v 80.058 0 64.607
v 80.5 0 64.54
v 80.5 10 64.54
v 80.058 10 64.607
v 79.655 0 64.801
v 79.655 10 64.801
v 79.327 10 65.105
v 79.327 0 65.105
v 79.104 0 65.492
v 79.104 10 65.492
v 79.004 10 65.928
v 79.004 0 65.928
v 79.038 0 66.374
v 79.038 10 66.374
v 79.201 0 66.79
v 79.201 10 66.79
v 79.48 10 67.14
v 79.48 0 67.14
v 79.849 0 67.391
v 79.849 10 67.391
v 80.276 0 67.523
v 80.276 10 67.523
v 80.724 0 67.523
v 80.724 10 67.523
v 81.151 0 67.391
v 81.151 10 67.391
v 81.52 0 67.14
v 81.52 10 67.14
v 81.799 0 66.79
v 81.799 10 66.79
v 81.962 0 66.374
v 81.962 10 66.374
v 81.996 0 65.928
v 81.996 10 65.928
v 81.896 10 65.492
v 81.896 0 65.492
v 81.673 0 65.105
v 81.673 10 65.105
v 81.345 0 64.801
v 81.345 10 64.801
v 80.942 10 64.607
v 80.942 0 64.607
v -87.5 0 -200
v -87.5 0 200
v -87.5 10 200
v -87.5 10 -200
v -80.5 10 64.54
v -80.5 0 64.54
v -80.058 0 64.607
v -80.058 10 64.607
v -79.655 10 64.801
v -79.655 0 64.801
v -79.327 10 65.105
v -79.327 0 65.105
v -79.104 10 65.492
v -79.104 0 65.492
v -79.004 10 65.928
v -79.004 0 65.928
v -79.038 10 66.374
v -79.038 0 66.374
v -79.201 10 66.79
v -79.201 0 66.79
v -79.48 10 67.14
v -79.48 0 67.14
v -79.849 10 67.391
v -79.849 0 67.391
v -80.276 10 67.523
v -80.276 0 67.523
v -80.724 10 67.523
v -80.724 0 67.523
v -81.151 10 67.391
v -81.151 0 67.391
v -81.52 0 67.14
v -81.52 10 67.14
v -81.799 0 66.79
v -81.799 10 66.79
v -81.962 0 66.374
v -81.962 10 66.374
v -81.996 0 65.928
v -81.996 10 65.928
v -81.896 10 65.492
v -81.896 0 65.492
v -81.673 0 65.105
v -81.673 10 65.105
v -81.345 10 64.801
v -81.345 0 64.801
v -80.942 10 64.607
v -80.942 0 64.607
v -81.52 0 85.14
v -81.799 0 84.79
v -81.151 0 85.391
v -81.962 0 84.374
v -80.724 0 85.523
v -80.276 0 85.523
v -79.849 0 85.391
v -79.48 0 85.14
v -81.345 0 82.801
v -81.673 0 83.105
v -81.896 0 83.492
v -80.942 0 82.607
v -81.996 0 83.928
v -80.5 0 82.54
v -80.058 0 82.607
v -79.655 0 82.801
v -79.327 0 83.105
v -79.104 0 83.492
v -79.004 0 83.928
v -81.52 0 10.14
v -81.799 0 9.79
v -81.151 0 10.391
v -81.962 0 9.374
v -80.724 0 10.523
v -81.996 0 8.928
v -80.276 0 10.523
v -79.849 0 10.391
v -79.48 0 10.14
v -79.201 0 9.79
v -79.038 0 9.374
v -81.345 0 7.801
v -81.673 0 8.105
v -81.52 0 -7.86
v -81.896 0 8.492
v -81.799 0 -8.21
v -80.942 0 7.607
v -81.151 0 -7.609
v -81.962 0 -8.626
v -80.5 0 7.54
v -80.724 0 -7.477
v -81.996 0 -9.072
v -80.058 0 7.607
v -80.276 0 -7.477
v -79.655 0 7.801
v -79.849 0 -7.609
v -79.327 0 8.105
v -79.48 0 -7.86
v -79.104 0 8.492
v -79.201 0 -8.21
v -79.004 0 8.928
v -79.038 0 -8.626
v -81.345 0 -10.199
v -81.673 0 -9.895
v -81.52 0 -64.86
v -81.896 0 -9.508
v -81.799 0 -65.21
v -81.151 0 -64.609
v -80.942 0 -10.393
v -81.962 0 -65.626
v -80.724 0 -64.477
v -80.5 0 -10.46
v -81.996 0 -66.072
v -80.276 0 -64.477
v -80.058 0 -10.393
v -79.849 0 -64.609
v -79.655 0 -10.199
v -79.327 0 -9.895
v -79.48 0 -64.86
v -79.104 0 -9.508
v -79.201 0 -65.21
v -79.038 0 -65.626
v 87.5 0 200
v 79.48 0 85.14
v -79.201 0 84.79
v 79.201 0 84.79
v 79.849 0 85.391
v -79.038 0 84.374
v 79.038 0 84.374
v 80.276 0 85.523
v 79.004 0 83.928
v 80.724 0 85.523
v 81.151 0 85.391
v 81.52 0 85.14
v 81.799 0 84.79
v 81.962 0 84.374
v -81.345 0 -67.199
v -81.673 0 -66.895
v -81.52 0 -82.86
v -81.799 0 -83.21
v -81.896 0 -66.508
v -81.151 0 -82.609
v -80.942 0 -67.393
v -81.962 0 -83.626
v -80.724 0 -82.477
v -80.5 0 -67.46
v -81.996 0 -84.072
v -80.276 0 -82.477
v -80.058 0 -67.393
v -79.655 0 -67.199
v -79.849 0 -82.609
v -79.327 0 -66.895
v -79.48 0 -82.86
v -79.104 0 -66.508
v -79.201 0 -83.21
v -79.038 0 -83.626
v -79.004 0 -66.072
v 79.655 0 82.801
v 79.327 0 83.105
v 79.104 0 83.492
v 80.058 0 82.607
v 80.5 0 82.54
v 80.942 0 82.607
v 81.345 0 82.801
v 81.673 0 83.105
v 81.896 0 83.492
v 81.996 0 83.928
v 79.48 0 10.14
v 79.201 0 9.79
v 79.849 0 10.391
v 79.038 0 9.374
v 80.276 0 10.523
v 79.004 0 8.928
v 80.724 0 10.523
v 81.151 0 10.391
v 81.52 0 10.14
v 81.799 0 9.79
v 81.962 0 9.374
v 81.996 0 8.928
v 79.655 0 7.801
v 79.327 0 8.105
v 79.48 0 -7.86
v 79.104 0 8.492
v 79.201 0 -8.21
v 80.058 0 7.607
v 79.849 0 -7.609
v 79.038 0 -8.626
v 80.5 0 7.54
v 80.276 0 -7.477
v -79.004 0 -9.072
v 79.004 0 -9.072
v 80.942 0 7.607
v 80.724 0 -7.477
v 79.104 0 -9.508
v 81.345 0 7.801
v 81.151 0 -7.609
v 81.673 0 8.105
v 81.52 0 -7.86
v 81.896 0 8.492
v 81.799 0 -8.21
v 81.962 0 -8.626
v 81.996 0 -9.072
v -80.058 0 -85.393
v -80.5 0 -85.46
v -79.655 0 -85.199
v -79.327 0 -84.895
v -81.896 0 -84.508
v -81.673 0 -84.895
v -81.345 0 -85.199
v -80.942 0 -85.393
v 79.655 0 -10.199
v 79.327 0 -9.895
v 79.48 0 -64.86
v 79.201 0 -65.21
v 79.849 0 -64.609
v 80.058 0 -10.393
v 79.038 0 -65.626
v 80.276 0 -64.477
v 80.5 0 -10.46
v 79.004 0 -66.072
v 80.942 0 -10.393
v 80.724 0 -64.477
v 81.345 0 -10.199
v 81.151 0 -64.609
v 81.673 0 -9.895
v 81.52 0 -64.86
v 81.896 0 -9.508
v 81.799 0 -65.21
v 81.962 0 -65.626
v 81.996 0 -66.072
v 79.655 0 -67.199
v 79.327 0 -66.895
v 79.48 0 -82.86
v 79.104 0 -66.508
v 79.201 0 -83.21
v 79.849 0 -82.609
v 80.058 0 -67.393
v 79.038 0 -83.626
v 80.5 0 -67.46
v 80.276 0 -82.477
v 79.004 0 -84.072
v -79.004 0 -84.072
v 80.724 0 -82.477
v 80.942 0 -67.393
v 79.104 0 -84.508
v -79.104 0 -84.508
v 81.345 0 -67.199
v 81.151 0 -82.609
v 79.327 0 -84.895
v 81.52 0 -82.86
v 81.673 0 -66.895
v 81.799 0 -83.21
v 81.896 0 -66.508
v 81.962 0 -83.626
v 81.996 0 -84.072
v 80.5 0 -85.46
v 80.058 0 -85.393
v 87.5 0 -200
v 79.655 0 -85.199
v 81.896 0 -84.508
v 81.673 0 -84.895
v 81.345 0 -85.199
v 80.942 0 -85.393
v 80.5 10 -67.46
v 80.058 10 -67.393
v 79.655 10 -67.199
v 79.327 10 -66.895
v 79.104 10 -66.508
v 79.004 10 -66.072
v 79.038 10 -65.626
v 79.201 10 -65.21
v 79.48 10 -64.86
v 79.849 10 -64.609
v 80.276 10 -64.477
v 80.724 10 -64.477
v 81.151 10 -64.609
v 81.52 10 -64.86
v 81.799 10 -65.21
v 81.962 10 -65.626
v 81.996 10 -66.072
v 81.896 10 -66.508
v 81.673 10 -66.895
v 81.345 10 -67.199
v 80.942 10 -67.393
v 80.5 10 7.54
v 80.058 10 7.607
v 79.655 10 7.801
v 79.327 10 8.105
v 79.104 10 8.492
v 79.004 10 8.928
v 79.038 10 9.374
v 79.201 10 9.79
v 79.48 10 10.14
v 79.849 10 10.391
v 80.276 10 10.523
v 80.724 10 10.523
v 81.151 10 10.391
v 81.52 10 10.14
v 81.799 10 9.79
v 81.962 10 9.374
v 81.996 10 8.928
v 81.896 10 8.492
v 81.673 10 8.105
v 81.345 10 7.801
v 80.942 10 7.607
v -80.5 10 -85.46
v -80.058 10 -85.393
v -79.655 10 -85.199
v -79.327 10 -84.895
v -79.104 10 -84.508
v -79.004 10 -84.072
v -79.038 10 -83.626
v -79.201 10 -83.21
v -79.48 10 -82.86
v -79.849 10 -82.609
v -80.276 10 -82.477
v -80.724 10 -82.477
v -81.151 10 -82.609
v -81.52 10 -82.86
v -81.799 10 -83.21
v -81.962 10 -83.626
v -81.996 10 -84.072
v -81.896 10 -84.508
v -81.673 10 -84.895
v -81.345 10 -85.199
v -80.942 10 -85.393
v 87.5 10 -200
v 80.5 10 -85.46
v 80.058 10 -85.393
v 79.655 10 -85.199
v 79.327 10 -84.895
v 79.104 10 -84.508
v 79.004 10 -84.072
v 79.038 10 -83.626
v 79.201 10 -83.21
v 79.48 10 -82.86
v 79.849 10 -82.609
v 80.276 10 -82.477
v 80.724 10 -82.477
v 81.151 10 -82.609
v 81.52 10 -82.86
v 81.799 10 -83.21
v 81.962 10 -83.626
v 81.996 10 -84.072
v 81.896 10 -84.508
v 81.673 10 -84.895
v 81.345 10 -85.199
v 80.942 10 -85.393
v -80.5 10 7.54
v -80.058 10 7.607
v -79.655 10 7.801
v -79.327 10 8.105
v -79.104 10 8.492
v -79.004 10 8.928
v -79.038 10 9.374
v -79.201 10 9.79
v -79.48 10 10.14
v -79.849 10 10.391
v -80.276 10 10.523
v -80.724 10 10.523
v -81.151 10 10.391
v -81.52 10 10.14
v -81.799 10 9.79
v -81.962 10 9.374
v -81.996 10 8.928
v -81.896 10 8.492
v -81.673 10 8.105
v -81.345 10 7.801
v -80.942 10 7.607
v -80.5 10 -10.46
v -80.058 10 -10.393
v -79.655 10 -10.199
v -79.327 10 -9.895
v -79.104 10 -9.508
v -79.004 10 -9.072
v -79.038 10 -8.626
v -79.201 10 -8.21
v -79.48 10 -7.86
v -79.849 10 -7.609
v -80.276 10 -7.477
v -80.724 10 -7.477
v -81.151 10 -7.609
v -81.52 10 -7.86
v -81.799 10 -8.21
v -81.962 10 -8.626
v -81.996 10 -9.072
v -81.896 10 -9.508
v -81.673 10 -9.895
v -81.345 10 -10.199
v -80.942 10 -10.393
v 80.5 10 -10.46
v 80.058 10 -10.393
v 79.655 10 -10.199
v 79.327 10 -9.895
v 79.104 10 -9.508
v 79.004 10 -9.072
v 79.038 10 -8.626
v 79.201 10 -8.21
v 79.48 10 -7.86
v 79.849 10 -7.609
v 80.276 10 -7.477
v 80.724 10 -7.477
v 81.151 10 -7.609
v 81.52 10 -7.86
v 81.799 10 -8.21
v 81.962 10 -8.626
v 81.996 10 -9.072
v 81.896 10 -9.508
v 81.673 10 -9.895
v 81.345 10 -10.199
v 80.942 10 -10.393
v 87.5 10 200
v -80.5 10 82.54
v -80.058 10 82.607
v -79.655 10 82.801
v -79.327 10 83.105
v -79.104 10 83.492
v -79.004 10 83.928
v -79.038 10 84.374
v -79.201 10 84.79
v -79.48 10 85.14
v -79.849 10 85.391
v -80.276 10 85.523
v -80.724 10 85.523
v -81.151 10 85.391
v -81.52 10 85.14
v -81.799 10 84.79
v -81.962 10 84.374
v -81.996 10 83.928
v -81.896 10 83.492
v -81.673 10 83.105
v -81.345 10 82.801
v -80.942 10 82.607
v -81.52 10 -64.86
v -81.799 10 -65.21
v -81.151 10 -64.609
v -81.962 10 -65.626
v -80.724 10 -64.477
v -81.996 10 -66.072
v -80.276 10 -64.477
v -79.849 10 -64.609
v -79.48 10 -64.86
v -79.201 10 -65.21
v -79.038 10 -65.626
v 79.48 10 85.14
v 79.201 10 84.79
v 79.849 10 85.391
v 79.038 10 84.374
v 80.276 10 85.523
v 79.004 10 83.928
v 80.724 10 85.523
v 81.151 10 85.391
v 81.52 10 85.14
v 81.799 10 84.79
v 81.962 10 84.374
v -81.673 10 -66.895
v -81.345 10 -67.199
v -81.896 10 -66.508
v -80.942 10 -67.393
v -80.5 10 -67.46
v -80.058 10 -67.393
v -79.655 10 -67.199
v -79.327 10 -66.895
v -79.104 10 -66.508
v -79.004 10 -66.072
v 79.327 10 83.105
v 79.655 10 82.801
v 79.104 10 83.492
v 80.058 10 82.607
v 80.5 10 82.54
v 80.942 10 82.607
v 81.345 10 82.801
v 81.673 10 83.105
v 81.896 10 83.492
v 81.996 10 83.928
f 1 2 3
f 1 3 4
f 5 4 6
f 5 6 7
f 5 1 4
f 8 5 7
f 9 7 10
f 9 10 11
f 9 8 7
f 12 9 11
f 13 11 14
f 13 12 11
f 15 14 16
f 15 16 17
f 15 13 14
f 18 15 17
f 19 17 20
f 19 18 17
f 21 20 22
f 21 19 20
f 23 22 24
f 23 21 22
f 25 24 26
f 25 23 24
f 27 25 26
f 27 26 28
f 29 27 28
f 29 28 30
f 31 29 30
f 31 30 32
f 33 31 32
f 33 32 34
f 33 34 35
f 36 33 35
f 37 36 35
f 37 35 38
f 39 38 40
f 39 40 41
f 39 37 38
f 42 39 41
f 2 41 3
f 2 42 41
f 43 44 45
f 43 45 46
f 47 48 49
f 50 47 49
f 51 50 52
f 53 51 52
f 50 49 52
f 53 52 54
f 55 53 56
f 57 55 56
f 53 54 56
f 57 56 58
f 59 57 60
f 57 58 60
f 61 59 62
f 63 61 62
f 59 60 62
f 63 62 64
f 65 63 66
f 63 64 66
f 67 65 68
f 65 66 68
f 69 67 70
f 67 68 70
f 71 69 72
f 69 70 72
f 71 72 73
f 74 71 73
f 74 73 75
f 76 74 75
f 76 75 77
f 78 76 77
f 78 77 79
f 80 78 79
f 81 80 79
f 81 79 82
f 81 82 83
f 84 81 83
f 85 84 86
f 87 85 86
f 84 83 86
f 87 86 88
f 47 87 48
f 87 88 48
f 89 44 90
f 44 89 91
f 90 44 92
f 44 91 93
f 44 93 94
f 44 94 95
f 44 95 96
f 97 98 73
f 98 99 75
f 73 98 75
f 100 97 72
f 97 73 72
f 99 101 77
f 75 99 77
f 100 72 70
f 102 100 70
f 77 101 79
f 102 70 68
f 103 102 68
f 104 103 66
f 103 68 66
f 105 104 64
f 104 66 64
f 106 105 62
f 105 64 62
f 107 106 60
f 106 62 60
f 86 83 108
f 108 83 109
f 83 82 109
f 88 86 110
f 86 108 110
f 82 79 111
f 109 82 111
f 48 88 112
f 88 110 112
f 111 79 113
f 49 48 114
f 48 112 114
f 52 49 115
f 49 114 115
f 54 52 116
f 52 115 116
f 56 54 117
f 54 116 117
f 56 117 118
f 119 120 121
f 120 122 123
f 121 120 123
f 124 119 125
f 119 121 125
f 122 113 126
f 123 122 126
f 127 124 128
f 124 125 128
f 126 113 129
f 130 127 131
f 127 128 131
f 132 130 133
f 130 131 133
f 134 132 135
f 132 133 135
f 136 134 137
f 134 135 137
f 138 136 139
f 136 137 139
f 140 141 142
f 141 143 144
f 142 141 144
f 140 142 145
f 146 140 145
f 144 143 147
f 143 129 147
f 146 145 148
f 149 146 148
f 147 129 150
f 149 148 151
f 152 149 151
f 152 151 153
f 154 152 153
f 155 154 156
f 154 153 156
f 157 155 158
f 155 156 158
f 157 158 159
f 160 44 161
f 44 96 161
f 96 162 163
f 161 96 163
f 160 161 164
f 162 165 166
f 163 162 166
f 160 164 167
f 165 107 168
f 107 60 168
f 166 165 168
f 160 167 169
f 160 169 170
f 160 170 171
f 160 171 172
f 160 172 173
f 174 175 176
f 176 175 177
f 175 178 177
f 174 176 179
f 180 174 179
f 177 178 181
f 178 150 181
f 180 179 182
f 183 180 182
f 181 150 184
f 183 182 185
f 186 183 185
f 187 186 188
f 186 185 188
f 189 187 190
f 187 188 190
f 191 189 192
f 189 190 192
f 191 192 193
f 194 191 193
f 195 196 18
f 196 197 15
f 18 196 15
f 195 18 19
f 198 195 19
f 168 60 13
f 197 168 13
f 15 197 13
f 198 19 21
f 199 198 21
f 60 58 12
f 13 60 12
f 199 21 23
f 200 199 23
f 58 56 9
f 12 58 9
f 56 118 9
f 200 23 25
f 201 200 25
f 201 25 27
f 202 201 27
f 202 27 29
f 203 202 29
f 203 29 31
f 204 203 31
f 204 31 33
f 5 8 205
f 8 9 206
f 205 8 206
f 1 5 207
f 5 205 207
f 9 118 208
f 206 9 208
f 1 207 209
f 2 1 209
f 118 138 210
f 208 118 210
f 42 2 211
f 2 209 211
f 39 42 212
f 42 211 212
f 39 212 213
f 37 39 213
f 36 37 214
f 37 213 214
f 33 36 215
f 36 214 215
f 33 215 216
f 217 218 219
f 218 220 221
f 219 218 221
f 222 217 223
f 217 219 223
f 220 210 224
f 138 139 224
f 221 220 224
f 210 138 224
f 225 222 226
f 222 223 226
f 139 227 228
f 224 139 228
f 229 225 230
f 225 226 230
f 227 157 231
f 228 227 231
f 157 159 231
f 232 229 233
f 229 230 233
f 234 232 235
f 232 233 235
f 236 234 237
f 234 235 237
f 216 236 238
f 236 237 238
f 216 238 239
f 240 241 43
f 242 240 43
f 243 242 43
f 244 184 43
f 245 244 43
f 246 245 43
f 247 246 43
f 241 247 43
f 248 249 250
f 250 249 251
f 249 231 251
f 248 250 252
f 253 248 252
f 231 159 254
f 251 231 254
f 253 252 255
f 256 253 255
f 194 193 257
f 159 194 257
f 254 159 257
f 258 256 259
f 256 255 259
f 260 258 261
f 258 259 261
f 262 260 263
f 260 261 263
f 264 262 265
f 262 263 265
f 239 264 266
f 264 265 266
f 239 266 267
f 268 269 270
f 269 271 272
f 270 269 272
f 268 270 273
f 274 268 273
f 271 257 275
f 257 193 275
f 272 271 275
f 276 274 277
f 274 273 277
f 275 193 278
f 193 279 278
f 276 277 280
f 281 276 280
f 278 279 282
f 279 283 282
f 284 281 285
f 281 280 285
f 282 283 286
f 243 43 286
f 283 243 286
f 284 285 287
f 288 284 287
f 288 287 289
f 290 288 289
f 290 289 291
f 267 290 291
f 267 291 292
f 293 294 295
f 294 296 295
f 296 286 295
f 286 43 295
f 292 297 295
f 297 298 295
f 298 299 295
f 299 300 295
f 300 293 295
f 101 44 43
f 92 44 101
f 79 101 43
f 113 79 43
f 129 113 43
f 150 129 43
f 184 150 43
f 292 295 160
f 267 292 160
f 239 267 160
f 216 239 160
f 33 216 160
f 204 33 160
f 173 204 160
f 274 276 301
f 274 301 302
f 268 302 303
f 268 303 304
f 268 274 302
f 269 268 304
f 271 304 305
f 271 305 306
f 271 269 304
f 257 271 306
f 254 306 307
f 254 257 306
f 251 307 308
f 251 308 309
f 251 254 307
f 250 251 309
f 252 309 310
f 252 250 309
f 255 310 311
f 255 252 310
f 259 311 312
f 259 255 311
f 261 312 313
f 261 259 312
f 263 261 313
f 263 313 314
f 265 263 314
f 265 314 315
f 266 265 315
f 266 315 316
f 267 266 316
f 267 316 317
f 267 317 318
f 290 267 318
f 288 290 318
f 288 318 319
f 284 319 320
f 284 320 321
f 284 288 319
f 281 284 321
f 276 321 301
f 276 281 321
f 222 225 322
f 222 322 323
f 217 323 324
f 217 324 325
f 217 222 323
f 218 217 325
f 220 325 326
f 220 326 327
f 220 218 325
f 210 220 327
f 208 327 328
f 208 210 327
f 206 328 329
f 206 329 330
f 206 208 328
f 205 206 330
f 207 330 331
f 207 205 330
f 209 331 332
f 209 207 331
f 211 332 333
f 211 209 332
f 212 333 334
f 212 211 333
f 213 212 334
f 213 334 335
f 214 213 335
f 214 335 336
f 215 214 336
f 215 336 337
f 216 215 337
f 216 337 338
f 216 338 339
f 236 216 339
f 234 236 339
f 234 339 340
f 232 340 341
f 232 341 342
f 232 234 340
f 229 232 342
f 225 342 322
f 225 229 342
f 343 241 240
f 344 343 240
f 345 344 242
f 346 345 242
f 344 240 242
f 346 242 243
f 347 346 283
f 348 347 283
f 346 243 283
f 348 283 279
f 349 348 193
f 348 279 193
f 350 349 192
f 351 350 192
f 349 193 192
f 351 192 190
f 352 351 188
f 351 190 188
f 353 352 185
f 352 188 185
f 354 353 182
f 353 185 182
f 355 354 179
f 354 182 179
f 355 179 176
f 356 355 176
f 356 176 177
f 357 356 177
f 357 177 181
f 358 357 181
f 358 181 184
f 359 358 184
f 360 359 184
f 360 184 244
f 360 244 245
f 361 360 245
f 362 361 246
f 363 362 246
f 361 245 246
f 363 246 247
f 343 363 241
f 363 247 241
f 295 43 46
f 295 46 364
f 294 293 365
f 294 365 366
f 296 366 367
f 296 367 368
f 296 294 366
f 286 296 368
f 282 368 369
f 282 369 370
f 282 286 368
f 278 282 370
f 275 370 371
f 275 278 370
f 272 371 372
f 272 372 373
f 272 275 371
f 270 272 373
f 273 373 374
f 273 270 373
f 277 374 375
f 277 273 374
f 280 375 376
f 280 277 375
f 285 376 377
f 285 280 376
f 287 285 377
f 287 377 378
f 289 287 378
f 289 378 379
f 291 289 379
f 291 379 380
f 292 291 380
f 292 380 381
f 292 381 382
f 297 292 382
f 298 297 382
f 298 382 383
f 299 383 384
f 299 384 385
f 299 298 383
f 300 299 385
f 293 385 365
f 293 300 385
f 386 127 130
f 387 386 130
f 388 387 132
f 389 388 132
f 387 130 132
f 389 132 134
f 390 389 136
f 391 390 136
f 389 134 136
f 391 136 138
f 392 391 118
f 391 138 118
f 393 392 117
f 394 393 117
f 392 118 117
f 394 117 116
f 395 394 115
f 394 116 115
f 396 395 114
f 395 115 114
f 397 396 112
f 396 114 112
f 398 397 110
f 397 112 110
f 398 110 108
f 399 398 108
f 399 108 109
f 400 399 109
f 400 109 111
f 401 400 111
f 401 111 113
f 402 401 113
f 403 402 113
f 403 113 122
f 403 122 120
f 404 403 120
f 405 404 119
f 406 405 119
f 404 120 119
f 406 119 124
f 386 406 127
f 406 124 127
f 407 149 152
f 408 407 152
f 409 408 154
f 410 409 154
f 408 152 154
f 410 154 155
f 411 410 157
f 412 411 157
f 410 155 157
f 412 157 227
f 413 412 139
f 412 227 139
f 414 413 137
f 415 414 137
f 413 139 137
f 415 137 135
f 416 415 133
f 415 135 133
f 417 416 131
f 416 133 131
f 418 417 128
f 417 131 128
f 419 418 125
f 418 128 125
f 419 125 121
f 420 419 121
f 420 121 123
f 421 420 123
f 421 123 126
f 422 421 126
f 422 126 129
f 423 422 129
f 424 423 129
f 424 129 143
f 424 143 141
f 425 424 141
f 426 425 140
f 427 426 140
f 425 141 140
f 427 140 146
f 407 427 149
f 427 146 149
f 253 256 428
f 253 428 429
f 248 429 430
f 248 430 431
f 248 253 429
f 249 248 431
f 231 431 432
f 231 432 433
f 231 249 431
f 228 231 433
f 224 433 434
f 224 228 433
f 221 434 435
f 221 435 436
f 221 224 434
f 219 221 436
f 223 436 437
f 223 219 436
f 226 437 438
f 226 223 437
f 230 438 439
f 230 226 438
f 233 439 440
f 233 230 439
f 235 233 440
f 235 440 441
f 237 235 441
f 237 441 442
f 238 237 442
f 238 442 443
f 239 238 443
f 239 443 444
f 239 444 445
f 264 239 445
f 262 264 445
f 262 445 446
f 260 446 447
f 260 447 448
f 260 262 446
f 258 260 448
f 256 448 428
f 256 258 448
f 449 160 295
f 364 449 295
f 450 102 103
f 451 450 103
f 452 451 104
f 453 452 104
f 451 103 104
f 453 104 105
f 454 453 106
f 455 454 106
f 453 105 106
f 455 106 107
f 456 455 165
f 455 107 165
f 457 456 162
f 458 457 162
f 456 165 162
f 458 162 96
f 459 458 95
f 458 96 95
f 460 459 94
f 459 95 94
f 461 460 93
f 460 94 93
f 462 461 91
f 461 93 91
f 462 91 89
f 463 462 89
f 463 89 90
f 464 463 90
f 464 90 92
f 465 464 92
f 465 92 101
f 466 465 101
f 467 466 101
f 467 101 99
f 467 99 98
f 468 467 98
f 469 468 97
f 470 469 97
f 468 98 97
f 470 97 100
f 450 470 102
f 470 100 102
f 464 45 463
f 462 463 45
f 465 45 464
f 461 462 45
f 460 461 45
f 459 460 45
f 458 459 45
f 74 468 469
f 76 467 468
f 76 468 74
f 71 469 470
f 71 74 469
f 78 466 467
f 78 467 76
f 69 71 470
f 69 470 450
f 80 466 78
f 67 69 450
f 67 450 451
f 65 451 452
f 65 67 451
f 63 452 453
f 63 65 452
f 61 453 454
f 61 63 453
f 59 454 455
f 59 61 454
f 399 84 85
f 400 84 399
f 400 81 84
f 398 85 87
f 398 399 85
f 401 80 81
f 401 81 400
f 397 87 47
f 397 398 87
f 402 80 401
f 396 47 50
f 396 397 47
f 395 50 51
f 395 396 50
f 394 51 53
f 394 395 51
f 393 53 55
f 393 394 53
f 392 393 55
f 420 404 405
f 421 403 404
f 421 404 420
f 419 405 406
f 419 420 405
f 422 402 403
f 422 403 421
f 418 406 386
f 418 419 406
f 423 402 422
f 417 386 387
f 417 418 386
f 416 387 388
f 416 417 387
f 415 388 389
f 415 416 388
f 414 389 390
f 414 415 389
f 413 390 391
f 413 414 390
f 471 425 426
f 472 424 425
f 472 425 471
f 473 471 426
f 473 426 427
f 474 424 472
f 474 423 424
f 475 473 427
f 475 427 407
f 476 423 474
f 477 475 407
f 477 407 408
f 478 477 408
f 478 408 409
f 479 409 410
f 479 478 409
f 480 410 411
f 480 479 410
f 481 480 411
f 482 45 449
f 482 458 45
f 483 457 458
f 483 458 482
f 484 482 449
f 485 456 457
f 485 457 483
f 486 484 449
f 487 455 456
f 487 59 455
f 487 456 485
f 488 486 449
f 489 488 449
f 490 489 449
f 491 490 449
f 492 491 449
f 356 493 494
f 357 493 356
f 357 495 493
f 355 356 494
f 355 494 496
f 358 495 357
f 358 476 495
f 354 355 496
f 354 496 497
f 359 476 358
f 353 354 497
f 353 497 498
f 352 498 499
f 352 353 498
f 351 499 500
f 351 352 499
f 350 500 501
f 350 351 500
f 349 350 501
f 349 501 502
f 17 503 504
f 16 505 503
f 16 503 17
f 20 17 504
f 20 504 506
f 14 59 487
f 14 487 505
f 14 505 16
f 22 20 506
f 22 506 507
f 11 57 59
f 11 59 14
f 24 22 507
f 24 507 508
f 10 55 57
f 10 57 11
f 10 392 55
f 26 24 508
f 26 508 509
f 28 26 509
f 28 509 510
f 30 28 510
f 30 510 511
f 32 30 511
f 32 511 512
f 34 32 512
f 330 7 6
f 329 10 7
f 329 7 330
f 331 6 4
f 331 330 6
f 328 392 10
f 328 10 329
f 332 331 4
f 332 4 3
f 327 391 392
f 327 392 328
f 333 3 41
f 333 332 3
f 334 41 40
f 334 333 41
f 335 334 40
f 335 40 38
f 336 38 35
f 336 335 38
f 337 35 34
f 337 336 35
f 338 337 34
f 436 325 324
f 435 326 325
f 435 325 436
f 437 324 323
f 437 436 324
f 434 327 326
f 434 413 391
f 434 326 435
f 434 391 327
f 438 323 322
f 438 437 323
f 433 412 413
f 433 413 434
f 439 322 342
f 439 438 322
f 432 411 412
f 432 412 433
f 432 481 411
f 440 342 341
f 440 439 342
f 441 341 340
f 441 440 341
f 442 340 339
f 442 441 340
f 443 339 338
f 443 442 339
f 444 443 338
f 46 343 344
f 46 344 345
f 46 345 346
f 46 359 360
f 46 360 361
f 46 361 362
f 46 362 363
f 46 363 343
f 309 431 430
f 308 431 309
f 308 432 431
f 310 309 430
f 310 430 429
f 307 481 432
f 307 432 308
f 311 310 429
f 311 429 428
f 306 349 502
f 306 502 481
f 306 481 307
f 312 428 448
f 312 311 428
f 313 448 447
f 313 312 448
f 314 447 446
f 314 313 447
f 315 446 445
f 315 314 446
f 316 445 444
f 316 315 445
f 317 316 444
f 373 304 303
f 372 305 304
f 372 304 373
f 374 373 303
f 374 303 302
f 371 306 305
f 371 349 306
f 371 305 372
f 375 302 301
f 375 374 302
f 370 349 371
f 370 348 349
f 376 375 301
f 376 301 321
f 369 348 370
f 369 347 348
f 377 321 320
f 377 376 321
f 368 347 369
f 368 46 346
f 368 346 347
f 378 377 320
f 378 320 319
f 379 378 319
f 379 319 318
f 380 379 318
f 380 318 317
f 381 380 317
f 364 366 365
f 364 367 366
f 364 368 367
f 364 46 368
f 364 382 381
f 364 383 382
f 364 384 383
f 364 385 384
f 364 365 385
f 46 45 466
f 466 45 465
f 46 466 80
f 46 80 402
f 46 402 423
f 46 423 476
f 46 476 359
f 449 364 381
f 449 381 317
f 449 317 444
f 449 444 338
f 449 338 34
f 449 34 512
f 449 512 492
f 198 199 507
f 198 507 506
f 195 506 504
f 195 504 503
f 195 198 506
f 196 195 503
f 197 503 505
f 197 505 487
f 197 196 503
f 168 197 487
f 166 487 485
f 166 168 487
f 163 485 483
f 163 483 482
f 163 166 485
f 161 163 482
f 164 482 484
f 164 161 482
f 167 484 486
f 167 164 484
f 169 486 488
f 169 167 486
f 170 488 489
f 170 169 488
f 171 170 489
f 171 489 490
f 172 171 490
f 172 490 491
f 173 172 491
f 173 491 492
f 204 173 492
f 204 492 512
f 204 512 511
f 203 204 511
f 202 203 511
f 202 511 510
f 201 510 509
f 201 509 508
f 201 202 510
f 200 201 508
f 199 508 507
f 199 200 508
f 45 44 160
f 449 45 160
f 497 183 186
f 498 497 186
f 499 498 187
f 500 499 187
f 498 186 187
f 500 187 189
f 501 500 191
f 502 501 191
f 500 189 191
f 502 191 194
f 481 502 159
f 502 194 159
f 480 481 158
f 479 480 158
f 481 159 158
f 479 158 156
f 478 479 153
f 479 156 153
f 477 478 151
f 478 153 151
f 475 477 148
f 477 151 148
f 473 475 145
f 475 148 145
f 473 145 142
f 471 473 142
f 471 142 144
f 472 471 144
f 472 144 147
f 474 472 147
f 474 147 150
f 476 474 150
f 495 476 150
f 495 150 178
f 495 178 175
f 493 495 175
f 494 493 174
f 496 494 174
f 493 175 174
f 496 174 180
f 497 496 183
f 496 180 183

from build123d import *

# Parameters (mm, degrees)
SKETCH_1_W          = 175
SKETCH_1_H          = 400
EXTRUDE_1_DEPTH     = 10
SKETCH_3_R          = 1.5
CUT_EXTRUDE_1_DEPTH = 10


with BuildPart() as part:
    # 草图1 → 凸台-拉伸1 (new body)
    with BuildSketch(Plane(origin=(0, 0, 0), x_dir=(1, 0, 0), z_dir=(0, 1, 0))):
        Rectangle(SKETCH_1_W, SKETCH_1_H)
    extrude(amount=EXTRUDE_1_DEPTH)

    # 草图3 → 切除-拉伸1 (cut)
    with BuildSketch(Plane.XZ):
        with Locations(Location((-80.5, -83.96, 0), (0, 0, 270))):
            Circle(SKETCH_3_R)
        with Locations(Location((-80.5, -65.96, 0), (0, 0, 270))):
            Circle(SKETCH_3_R)
        with Locations(Location((-80.5, -8.96, 0), (0, 0, 270))):
            Circle(SKETCH_3_R)
        with Locations(Location((-80.5, 9.04, 0), (0, 0, 270))):
            Circle(SKETCH_3_R)
        with Locations(Location((-80.5, 66.04, 0), (0, 0, 270))):
            Circle(SKETCH_3_R)
        with Locations(Location((-80.5, 84.04, 0), (0, 0, 270))):
            Circle(SKETCH_3_R)
    cut_extrude_1 = extrude(amount=-CUT_EXTRUDE_1_DEPTH, mode=Mode.SUBTRACT)

    # 镜向1: 切除-拉伸1 across plane
    add(cut_extrude_1.mirror(Plane(origin=(0, 0, 0), x_dir=(0, 0, 1), z_dir=(1, 0, 0))), mode=Mode.SUBTRACT)


solid = part.part
